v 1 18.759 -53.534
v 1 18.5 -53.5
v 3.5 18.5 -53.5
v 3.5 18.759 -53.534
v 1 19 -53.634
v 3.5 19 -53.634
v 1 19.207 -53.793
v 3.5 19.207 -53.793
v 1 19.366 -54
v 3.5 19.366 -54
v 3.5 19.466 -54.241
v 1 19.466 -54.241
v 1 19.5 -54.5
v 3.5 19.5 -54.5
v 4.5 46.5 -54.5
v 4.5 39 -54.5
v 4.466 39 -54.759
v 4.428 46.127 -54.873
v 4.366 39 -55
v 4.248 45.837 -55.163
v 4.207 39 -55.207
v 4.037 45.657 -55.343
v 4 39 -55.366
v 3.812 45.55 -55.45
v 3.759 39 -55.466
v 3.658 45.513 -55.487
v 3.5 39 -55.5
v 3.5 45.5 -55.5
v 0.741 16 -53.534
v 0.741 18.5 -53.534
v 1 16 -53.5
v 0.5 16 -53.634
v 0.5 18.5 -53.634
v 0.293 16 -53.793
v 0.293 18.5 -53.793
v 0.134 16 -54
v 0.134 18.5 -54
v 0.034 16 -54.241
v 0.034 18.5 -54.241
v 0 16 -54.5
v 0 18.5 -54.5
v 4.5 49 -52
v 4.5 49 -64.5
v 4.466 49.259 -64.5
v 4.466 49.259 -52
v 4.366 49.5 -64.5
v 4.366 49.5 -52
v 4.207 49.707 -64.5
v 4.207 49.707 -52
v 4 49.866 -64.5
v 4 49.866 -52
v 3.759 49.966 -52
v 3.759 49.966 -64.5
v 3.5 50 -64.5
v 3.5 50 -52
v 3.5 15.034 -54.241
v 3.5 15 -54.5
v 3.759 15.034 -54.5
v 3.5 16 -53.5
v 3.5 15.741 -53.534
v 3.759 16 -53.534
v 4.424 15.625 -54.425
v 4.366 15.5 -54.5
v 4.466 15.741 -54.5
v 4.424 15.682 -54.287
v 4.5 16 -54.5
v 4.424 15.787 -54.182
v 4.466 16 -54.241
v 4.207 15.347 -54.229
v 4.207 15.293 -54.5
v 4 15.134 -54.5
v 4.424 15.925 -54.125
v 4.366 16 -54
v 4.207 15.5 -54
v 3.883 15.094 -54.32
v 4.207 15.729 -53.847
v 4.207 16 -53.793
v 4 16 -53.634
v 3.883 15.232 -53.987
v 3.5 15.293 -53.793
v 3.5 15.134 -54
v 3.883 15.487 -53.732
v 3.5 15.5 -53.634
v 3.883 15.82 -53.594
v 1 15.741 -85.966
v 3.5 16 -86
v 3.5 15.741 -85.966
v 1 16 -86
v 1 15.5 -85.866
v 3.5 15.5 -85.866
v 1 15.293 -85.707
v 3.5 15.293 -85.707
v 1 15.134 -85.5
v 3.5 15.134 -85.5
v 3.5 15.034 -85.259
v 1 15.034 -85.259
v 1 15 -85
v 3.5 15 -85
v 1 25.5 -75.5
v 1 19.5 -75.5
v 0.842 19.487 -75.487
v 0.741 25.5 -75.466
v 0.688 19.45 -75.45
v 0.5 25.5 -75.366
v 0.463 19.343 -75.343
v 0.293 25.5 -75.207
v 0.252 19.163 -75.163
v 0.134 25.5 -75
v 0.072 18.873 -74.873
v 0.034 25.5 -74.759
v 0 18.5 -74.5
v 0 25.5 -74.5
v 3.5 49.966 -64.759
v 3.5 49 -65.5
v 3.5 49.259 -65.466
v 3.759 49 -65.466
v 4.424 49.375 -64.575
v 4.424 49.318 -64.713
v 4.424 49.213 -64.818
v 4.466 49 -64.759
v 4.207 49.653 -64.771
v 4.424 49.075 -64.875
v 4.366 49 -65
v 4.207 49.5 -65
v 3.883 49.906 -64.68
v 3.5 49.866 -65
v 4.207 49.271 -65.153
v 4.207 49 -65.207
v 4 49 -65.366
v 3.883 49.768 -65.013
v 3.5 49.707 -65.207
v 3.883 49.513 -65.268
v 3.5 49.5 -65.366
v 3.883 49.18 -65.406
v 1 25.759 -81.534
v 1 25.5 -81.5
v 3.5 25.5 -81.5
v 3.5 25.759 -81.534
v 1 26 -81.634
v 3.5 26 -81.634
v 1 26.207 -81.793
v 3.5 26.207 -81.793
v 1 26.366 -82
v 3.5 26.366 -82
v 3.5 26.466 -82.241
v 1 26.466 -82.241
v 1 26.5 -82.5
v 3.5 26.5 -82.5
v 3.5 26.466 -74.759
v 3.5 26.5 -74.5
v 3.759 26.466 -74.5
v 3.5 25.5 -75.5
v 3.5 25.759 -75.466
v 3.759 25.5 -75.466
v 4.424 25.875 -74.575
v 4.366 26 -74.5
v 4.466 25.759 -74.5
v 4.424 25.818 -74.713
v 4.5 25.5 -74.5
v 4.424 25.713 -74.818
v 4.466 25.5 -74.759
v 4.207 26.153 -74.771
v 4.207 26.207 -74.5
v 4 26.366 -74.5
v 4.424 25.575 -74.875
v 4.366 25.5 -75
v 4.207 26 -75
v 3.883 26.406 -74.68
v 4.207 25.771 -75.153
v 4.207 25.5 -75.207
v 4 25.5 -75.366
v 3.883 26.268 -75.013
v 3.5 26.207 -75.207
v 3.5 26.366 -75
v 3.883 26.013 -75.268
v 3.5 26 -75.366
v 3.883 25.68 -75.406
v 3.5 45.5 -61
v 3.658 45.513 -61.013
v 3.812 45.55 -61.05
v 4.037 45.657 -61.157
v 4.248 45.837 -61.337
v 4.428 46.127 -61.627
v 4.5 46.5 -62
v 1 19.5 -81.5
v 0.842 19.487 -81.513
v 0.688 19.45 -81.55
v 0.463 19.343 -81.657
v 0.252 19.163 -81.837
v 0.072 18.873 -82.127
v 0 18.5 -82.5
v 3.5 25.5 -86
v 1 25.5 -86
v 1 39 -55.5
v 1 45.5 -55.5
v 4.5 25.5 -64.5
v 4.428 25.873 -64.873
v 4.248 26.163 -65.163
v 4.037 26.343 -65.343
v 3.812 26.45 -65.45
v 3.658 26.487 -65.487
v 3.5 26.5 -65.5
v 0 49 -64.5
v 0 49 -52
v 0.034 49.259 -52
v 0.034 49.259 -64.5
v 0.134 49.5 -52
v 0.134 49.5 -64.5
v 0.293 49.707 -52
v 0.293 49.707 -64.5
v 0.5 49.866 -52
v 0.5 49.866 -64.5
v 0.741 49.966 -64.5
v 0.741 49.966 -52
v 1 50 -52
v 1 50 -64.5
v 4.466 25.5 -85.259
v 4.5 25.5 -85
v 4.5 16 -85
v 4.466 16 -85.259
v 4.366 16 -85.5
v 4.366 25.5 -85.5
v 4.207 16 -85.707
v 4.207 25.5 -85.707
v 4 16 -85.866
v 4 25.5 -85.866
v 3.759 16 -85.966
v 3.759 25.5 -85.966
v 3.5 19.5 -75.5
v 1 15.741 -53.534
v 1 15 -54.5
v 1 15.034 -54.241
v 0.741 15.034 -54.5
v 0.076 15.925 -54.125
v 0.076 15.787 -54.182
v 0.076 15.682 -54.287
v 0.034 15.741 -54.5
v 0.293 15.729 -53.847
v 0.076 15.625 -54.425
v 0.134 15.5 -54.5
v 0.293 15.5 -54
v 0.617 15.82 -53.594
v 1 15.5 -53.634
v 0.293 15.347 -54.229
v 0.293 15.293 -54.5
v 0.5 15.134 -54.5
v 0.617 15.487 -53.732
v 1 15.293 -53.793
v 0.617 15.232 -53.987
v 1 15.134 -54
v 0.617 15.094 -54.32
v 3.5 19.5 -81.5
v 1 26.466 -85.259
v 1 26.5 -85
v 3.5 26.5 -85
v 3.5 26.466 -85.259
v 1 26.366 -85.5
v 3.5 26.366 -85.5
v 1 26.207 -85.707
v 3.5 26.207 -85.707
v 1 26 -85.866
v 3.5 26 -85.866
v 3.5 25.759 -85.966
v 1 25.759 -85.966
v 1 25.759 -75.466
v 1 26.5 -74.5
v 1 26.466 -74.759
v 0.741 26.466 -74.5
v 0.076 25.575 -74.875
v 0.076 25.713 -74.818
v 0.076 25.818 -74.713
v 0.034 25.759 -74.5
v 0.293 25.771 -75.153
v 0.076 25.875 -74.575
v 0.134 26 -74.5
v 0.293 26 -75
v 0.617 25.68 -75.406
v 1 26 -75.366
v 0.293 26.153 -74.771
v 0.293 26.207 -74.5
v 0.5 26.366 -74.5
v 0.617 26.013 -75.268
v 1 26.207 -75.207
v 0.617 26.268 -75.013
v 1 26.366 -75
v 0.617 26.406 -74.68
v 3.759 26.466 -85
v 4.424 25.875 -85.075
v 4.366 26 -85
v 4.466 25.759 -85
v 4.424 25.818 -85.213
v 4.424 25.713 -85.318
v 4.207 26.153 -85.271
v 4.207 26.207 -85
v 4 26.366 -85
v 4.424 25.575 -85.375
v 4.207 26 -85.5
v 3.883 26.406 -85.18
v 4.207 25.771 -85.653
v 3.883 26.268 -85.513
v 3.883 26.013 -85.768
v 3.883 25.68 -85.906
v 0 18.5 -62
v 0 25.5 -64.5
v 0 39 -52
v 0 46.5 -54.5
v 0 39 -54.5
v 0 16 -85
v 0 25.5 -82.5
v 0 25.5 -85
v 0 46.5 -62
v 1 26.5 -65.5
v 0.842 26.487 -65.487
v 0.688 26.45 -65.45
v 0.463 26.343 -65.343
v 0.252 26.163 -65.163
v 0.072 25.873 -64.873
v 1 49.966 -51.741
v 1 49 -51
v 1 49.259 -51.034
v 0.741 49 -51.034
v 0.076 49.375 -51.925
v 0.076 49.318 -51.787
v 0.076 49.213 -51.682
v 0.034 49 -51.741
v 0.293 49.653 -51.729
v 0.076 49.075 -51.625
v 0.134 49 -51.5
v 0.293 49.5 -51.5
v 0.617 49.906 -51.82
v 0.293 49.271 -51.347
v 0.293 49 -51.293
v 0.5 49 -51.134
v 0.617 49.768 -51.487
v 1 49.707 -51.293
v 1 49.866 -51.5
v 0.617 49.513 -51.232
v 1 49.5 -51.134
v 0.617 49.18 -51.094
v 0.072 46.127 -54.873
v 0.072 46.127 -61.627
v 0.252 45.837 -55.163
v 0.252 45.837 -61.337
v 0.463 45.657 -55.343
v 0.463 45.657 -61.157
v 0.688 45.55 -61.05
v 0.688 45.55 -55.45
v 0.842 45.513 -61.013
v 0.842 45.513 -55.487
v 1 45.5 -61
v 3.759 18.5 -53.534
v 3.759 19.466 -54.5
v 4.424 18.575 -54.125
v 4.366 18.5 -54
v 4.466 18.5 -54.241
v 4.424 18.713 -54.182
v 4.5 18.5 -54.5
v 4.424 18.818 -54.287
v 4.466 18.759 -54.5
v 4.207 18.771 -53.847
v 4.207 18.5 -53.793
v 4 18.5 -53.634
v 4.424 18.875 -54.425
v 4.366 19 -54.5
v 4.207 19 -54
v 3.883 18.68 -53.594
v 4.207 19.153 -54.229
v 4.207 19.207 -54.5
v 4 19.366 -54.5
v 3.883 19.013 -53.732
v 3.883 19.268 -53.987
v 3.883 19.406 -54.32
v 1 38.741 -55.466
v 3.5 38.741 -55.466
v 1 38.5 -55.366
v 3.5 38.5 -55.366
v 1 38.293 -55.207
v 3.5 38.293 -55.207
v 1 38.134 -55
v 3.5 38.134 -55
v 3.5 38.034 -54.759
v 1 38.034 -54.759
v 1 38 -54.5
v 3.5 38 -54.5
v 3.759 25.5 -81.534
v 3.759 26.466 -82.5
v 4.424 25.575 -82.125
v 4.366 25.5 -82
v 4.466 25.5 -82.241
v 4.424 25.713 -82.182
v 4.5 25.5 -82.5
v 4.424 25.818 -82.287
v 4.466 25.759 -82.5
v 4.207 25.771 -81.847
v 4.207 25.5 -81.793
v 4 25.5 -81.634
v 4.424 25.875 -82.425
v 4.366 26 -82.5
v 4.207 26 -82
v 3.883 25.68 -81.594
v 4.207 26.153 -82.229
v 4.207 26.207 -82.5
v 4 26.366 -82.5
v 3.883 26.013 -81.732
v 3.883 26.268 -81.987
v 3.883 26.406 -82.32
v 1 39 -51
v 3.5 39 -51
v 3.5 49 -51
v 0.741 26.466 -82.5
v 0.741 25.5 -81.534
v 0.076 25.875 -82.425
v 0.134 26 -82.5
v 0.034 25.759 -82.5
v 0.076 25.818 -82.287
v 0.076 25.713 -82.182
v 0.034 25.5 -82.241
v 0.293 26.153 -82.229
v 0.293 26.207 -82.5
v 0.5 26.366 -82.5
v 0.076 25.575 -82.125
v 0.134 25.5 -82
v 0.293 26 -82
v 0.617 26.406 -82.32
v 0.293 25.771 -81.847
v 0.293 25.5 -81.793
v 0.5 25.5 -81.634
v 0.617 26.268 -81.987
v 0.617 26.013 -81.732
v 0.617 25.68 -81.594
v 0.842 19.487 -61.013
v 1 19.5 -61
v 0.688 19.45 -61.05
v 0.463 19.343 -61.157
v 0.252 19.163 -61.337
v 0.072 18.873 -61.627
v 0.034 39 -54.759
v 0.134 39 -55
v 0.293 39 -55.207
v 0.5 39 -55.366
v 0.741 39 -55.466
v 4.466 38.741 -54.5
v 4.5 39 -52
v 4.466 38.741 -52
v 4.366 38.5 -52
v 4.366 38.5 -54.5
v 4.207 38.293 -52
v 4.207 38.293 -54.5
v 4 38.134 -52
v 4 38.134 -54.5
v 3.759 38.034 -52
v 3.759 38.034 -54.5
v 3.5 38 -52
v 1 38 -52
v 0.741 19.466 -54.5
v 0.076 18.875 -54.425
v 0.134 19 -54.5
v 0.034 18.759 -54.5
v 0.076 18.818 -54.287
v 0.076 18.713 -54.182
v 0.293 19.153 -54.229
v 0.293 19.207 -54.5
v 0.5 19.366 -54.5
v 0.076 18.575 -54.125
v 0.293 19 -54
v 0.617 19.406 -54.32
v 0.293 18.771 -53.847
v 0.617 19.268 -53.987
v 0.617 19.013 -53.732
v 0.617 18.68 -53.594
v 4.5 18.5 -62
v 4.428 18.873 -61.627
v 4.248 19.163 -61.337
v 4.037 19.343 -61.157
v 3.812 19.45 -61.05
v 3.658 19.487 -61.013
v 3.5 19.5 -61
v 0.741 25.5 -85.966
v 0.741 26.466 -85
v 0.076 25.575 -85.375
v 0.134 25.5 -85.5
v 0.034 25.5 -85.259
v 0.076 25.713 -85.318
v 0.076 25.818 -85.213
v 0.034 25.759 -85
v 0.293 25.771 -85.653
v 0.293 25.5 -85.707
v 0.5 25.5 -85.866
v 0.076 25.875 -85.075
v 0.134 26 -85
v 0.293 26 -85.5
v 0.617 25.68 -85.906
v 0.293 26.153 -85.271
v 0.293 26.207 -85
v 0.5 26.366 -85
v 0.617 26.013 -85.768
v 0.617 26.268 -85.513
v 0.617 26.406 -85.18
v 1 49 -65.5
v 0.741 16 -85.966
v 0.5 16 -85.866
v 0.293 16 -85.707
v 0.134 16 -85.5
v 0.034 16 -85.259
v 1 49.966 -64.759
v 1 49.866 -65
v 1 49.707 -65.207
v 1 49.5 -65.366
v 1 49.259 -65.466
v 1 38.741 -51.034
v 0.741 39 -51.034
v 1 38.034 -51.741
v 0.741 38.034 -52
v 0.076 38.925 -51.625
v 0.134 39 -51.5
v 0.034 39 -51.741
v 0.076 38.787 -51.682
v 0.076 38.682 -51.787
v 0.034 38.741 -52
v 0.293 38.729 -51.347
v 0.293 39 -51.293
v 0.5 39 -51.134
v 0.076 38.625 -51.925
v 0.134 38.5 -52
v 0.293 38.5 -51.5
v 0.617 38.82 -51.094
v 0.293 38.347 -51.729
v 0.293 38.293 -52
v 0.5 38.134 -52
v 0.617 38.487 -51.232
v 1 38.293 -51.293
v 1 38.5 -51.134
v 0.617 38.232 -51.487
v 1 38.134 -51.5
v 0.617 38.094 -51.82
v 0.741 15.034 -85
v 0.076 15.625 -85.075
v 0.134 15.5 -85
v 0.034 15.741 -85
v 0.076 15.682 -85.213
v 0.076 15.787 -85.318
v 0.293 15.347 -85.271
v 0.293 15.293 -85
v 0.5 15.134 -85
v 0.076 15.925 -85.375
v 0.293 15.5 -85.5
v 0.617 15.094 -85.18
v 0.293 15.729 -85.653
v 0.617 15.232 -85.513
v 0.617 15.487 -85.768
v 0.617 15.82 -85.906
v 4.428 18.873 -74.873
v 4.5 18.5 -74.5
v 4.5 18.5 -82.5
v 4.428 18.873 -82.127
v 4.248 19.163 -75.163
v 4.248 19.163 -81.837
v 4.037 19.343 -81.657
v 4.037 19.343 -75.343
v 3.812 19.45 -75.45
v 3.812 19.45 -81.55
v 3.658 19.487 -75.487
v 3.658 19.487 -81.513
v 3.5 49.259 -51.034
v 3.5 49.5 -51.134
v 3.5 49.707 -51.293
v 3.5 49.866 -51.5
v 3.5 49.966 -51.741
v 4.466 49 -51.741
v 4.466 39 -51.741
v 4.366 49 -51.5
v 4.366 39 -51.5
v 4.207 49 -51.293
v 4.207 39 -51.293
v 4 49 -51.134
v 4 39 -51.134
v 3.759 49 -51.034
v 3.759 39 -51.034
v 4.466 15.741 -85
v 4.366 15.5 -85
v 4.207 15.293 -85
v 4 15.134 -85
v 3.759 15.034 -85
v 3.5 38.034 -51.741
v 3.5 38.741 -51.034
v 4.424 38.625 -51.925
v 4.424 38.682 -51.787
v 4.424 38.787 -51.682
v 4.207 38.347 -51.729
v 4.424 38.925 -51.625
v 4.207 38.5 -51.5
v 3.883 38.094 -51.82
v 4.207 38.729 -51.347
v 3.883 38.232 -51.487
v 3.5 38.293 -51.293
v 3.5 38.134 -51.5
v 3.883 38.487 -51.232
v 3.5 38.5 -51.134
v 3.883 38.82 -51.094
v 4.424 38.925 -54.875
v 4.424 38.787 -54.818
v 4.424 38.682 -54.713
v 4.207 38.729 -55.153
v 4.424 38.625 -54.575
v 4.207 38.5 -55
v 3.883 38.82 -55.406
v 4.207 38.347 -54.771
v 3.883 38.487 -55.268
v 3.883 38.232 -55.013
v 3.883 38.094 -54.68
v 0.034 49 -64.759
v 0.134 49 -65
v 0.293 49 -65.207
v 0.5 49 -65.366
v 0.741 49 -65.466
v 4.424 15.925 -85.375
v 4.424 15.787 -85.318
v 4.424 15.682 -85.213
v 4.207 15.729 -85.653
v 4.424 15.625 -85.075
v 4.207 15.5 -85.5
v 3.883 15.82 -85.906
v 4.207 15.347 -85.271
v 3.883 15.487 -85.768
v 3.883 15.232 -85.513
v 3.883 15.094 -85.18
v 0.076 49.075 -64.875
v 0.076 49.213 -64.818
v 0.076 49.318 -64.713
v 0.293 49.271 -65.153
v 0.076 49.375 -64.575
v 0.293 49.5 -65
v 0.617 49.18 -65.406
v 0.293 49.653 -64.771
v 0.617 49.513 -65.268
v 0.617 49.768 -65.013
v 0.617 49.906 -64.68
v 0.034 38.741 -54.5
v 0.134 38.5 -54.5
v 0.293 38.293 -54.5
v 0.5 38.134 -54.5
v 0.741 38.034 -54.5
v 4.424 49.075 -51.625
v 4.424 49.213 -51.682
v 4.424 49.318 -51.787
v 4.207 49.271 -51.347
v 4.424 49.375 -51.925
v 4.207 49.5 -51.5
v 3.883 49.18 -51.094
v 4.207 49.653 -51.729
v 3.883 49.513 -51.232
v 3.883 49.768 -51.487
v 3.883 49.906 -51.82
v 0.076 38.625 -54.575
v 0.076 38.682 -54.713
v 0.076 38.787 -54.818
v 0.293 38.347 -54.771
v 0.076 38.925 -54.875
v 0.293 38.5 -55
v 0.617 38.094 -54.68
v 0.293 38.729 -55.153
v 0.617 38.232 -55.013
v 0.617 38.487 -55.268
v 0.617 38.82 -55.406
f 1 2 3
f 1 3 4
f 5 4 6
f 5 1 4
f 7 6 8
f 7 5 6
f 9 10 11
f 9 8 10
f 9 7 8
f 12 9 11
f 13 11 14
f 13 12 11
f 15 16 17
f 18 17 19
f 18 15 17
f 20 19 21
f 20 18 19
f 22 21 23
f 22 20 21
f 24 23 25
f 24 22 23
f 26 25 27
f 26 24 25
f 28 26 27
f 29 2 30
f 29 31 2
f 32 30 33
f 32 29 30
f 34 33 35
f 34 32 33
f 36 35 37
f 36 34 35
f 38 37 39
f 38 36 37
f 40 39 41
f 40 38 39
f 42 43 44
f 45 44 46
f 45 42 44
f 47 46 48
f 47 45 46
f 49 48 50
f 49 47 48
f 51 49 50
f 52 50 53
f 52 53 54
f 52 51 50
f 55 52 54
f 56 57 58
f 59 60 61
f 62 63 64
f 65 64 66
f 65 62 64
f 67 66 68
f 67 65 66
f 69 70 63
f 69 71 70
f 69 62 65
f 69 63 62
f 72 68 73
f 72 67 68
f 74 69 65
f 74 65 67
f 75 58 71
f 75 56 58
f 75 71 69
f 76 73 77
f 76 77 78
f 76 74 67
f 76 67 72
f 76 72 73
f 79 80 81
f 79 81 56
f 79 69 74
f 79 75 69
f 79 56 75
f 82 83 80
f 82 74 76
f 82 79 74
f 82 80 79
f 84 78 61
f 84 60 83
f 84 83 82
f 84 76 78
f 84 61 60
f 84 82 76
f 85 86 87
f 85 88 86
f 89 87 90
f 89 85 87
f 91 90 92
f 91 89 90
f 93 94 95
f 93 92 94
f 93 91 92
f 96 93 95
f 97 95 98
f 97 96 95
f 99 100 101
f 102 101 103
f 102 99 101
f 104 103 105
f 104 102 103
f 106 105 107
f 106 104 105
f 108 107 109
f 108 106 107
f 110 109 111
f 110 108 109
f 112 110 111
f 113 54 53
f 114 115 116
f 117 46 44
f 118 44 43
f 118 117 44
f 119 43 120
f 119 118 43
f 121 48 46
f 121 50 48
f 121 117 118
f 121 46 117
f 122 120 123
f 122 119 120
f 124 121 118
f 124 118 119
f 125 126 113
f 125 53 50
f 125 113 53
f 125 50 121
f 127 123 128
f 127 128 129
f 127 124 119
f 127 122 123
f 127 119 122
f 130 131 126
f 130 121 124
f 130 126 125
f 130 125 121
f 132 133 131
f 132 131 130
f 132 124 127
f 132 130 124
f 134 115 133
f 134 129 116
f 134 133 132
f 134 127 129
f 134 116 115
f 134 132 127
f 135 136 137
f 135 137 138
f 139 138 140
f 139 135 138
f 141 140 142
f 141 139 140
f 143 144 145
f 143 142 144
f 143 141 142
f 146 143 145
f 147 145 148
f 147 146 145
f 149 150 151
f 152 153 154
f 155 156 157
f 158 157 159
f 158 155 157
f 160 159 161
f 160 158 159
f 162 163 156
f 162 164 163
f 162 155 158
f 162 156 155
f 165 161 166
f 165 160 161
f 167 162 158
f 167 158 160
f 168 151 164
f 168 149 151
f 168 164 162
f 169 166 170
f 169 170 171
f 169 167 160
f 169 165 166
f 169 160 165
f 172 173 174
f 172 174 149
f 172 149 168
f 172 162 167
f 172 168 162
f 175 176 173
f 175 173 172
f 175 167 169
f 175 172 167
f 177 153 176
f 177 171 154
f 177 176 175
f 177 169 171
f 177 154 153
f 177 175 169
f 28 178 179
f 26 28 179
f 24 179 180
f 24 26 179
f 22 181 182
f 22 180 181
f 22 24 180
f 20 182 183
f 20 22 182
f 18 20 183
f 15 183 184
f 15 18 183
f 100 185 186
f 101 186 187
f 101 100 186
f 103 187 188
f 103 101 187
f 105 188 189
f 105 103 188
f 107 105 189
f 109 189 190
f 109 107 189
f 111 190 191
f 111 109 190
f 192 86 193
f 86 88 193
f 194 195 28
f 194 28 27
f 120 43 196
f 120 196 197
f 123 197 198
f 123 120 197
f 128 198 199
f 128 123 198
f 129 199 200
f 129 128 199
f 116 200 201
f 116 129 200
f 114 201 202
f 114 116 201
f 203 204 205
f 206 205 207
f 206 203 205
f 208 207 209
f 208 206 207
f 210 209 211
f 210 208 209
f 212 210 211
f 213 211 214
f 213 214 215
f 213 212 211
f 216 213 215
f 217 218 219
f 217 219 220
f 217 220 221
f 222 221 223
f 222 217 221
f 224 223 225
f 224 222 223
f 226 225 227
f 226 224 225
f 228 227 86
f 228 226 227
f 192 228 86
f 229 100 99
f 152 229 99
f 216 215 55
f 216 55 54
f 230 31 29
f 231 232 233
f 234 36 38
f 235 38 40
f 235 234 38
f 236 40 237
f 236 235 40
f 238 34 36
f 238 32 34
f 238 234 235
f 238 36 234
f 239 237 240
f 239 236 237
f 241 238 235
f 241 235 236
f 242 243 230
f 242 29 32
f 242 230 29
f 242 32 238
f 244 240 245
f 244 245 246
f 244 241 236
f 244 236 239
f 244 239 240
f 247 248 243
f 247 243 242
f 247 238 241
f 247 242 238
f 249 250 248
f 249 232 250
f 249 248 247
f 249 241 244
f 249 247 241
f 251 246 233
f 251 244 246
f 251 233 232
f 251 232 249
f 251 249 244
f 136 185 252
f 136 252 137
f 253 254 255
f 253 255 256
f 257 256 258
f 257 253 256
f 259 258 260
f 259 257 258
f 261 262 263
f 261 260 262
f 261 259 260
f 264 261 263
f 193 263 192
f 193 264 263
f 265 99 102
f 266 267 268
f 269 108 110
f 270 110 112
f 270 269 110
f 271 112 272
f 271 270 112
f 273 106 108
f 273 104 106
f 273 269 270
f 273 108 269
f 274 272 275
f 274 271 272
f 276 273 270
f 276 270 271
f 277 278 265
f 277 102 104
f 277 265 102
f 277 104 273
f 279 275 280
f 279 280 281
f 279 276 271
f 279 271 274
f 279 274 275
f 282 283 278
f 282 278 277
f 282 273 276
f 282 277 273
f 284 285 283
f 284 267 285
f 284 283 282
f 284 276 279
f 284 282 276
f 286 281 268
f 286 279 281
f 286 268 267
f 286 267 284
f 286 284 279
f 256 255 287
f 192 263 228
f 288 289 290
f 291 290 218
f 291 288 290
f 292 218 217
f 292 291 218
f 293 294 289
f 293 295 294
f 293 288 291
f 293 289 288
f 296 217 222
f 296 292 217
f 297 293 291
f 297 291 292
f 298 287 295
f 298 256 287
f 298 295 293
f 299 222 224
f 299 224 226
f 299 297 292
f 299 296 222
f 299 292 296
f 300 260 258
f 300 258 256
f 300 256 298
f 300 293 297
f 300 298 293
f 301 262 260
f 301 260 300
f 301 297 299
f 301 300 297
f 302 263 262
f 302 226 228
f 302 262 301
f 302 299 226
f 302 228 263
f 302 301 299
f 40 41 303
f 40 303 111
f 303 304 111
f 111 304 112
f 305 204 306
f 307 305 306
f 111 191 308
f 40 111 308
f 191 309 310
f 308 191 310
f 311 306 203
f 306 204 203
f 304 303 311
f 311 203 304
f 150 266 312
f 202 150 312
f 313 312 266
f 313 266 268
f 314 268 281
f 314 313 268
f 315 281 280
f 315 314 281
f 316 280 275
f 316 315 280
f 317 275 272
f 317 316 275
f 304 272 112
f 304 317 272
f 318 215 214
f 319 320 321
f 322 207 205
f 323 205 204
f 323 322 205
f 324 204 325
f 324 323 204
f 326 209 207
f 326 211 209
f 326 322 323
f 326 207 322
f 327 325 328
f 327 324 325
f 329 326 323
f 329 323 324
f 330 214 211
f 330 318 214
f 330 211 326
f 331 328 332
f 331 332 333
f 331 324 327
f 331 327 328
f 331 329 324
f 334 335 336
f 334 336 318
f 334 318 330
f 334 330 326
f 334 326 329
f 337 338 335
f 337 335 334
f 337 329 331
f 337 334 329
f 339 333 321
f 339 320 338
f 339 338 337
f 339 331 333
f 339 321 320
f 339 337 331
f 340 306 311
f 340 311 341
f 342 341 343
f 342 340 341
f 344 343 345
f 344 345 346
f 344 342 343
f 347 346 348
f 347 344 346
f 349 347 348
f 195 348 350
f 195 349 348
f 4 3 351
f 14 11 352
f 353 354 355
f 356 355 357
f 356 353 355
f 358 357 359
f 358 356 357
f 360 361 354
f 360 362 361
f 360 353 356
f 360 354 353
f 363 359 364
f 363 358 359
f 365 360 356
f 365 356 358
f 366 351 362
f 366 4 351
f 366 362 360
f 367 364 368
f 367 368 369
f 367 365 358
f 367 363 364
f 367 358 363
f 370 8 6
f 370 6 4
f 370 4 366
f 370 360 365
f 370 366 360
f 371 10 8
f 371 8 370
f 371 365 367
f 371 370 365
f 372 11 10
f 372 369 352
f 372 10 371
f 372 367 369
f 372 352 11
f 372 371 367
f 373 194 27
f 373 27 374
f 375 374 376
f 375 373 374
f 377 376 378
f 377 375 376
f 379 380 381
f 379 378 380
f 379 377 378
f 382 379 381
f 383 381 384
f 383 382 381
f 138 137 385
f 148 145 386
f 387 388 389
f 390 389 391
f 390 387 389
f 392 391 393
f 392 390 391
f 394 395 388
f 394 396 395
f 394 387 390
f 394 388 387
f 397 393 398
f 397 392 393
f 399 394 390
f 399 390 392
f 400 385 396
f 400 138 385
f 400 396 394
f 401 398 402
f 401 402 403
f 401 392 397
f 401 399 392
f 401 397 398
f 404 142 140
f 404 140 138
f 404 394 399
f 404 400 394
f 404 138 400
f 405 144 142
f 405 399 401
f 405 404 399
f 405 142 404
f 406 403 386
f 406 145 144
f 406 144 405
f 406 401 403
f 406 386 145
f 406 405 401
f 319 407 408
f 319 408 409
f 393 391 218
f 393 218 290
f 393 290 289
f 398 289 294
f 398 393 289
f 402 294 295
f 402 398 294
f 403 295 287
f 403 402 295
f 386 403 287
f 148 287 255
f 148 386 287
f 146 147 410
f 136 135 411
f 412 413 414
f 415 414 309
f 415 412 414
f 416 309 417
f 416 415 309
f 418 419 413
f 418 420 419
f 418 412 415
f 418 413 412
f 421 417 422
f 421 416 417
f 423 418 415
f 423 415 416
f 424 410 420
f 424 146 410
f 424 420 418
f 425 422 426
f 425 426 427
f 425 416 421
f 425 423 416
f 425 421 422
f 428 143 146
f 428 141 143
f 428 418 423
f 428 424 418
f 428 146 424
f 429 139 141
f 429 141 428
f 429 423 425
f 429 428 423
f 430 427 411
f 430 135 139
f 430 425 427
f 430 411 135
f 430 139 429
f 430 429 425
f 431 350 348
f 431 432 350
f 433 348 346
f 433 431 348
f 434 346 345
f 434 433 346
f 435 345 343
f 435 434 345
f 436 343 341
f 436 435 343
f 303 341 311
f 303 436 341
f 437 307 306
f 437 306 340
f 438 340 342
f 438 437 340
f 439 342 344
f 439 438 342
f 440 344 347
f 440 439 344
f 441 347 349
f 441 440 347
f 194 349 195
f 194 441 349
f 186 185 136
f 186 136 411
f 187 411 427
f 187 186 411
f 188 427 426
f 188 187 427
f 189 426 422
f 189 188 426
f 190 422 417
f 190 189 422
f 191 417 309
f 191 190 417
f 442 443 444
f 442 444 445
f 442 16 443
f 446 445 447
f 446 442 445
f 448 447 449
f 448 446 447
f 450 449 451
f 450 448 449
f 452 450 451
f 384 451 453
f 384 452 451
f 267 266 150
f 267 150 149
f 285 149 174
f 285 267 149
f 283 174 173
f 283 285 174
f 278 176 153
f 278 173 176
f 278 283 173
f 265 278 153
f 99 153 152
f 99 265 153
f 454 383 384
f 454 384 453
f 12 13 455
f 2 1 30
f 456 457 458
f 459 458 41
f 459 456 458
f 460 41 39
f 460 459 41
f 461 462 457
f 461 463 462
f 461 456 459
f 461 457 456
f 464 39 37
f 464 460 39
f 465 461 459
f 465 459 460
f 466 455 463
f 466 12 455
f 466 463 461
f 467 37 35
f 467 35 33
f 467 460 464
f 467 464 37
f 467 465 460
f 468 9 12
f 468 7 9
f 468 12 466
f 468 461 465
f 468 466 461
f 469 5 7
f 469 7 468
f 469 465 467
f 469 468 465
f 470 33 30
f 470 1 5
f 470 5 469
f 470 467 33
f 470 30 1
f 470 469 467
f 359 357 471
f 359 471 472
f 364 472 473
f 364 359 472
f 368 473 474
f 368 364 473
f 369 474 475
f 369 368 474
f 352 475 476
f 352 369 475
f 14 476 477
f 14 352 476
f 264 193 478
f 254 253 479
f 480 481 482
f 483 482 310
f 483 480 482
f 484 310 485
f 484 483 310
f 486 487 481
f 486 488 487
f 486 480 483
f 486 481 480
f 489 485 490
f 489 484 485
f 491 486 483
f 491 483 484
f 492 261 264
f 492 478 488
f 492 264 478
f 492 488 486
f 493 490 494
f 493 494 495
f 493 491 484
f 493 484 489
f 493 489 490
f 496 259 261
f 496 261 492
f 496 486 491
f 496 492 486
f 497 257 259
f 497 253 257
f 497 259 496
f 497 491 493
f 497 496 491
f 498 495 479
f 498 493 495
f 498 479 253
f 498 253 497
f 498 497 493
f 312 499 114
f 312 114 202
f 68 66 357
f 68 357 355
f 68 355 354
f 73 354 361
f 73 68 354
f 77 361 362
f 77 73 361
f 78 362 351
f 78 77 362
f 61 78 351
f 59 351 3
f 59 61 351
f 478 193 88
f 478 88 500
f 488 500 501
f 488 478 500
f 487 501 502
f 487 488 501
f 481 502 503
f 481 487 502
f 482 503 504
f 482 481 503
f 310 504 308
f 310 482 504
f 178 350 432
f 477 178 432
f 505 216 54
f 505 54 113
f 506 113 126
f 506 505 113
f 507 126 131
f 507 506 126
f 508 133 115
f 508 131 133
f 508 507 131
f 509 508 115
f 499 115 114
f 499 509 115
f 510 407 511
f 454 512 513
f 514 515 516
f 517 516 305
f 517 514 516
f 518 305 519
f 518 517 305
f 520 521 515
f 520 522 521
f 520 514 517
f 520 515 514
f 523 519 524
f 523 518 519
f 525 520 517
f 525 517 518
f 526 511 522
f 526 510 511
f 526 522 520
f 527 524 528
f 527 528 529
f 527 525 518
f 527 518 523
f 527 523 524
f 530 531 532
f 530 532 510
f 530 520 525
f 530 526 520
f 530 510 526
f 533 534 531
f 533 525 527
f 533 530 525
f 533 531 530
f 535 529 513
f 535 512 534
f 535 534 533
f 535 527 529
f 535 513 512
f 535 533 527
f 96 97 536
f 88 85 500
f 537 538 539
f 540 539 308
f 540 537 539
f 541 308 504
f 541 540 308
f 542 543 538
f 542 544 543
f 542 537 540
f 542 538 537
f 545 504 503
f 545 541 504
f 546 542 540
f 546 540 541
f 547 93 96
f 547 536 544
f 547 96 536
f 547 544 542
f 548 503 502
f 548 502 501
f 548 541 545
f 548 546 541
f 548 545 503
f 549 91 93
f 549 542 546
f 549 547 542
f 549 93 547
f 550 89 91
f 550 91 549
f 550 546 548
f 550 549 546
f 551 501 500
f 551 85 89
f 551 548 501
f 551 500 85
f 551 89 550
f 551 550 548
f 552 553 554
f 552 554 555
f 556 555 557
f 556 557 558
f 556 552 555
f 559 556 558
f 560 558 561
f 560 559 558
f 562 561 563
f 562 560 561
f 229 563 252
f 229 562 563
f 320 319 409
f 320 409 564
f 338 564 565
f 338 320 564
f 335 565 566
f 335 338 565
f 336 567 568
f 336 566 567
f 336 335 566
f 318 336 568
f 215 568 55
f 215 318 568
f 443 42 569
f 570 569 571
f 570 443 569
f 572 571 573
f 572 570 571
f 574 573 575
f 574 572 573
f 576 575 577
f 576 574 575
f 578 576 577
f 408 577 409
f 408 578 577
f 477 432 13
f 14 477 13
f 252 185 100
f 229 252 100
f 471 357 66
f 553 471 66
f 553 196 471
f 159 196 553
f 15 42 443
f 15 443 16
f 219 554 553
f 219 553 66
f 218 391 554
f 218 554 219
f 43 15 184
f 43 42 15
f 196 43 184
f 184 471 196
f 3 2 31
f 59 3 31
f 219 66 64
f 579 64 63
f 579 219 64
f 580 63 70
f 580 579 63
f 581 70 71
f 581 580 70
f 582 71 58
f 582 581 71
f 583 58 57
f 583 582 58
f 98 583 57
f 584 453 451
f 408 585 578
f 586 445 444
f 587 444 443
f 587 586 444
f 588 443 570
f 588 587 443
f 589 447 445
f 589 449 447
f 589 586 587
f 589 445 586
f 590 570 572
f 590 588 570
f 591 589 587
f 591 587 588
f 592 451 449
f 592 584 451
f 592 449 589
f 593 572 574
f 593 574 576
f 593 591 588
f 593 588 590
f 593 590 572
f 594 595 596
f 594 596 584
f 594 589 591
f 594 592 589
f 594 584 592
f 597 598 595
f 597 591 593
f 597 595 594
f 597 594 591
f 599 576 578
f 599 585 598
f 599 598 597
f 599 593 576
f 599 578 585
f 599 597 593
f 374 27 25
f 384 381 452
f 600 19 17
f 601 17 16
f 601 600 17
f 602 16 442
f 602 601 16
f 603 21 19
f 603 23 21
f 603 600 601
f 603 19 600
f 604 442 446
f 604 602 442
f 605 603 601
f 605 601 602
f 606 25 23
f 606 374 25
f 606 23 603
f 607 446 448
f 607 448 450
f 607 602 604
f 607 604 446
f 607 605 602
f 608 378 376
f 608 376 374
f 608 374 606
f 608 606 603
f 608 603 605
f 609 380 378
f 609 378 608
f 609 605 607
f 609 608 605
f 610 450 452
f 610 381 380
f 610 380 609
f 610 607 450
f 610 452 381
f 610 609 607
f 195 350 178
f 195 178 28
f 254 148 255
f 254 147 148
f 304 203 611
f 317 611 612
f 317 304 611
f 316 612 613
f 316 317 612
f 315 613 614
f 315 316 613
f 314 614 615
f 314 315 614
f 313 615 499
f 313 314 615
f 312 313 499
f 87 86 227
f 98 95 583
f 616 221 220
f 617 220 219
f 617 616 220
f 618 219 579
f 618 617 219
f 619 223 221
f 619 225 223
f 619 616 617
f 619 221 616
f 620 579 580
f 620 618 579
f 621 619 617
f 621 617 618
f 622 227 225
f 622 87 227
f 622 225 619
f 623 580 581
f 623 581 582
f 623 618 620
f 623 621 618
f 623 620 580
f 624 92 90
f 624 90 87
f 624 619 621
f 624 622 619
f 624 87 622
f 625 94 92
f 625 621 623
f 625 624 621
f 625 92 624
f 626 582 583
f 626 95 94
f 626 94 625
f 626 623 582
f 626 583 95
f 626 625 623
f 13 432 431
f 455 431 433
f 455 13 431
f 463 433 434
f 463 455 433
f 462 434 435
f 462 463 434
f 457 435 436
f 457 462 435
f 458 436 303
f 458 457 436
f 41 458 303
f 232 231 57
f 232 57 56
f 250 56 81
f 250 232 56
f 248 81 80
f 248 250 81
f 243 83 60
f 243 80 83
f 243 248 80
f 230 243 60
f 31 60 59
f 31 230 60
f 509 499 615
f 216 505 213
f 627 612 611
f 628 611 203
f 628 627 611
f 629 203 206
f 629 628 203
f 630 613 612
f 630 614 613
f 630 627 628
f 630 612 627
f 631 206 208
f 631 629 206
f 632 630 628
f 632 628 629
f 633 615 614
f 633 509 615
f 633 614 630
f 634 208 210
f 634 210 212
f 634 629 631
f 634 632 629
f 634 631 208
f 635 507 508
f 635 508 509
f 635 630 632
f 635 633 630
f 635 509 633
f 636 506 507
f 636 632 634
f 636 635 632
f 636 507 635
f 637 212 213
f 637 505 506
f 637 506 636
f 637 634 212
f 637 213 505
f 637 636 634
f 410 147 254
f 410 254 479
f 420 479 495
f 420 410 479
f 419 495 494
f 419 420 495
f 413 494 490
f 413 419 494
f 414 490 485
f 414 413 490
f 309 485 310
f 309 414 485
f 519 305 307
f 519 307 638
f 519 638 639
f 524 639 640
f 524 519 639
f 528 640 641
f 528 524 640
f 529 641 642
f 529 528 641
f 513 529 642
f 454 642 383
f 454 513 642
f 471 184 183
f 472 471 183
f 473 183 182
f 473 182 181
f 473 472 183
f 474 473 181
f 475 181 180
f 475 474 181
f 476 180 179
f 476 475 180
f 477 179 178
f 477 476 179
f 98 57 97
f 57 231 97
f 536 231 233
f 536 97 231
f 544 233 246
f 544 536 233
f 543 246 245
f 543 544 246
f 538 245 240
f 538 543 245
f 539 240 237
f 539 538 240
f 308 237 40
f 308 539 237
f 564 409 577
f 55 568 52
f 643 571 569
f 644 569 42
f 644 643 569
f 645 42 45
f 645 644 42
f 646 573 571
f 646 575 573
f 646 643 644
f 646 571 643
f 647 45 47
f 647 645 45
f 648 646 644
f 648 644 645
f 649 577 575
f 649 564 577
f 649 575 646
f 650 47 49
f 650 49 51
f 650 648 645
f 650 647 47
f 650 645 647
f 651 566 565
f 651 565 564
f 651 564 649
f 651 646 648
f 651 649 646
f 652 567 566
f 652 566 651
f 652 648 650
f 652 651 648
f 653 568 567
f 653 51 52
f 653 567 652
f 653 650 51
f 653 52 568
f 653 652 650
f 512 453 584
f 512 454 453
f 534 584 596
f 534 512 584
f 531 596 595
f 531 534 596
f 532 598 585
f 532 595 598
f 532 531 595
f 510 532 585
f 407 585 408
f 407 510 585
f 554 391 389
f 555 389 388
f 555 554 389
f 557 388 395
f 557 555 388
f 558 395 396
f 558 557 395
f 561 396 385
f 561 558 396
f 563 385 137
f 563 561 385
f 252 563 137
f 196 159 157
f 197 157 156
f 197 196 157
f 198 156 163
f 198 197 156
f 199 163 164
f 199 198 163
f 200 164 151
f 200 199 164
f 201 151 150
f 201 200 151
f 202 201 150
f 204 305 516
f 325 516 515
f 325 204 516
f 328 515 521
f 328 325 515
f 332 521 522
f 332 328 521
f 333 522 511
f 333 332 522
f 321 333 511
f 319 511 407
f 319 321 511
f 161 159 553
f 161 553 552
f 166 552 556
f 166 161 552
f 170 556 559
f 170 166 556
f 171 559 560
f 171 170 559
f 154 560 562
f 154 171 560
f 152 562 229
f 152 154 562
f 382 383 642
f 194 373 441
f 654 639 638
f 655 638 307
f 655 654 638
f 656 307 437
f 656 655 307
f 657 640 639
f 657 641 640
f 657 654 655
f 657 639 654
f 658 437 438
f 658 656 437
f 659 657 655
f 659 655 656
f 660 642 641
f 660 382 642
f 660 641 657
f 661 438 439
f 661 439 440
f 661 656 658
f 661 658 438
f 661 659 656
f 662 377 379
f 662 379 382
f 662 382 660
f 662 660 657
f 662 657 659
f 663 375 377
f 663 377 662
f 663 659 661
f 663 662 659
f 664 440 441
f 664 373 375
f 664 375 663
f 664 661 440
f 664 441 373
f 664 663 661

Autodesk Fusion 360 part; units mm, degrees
sketch "Sketch1" plane through (0, 0, 0) normal (1, 0, 0) x (0, 0, -1)
  line L0 (-50, 20) -> (-4, 20)
  line L1 (-4, 20) -> (-4, -11.5)
  line L2 (-4, -11.5) -> (-50, -11.5)
  line L3 (-50, -11.5) -> (-50, 20)
  line L4 (-65.5096, 6.4803) -> (-1.0096, 6.4803)
  line L5 (-1.0096, 6.4803) -> (-1.0096, -9.308)
  line L6 (-1.0096, -9.308) -> (-65.5096, -9.308)
  line L7 (-65.5096, -9.308) -> (-65.5096, 6.4803)
  line L8 (52, 50) -> (64.5, 50)
  line L9 (65.5, 49) -> (65.5, 45.5)
  line L10 (65.5, 45.5) -> (51, 45.5)
  line L11 (51, 45.5) -> (51, 49)
  line L12 (51, 45.5) -> (55.5, 45.5)
  line L13 (55.5, 45.5) -> (55.5, 39)
  line L14 (54.5, 38) -> (52, 38)
  line L15 (51, 39) -> (51, 45.5)
  line L16 (65.5, 45.5) -> (61, 45.5)
  line L17 (61, 45.5) -> (61, 19.5)
  line L18 (61, 19.5) -> (65.5, 19.5)
  line L19 (65.5, 19.5) -> (65.5, 45.5)
  line L20 (65.5, 19.5) -> (54.5, 19.5)
  line L21 (53.5, 18.5) -> (53.5, 16)
  line L22 (54.5, 15) -> (65.5, 15)
  line L23 (65.5, 15) -> (65.5, 19.5)
  line L24 (65.5, 15) -> (75.5, 15)
  line L25 (75.5, 15) -> (75.5, 25.5)
  line L26 (74.5, 26.5) -> (65.5, 26.5)
  line L27 (65.5, 26.5) -> (65.5, 15)
  line L28 (75.5, 15) -> (85, 15)
  line L29 (86, 16) -> (86, 19.5)
  line L30 (86, 19.5) -> (75.5, 19.5)
  line L31 (75.5, 19.5) -> (75.5, 15)
  line L32 (86, 19.5) -> (81.5, 19.5)
  line L33 (81.5, 19.5) -> (81.5, 25.5)
  line L34 (82.5, 26.5) -> (85, 26.5)
  line L35 (86, 25.5) -> (86, 19.5)
  arc A0 (52, 50) -> (51, 49) centre (52, 49) ccw
  arc A1 (65.5, 49) -> (64.5, 50) centre (64.5, 49) ccw
  arc A2 (51, 39) -> (52, 38) centre (52, 39) ccw
  arc A3 (54.5, 38) -> (55.5, 39) centre (54.5, 39) ccw
  arc A4 (54.5, 19.5) -> (53.5, 18.5) centre (54.5, 18.5) ccw
  arc A5 (53.5, 16) -> (54.5, 15) centre (54.5, 16) ccw
  arc A6 (75.5, 25.5) -> (74.5, 26.5) centre (74.5, 25.5) ccw
  arc A7 (82.5, 26.5) -> (81.5, 25.5) centre (82.5, 25.5) ccw
  arc A8 (86, 25.5) -> (85, 26.5) centre (85, 25.5) ccw
  arc A9 (85, 15) -> (86, 16) centre (85, 16) ccw
  point P0 (51, 50)
  point P1 (65.5, 50)
  point P2 (51, 38)
  point P3 (53.5, 19.5)
  point P4 (86, 15)
  point P5 (86, 26.5)
  dimension "d1" = 46
  dimension "d2" = 31.5
  dimension "d3" = 64.5
  dimension "d4" = 14.5
  dimension "d5" = 4.5
  dimension "d6" = 4.5
  dimension "d7" = 7.5
  dimension "d8" = 4.5
  dimension "d9" = 26
  dimension "d10" = 12
  dimension "d11" = 4.5
  dimension "d12" = 10
  dimension "d13" = 11.5
  dimension "d14" = 10.5
  dimension "d15" = 4.5
  dimension "d16" = 4.5
  dimension "d17" = 7
  dimension "d18" = 1
extrude "Extrude1" add sketch "Sketch1" along normal blind 4.5 contours L8 L9 L10 L11 L12 L16 A0 A1 | L10 L12 L13 L14 L15 A2 A3 | L10 L16 L17 L18 L19 L20 L27 | L19 L23 L24 L25 L26 L27 L31 A6 | L18 L20 L21 L22 L23 L27 A4 A5 | L25 L28 L29 L30 L31 L32 A9 | L30 L32 L33 L34 L35 A7 A8
fillet "Fillet1" radius 1 26 edges at (4.5, 37.75, -65.5) (4.5, 49.7071, -65.2071) (4.5, 50, -58.25) (4.5, 49.7071, -51.2929) (4.5, 44, -51) (4.5, 38.2929, -51.2929) (4.5, 38, -53.25) (4.5, 38.2929, -55.2071) (4.5, 42.25, -55.5) (4.5, 22.5, -75.5) (4.5, 26.2071, -75.2071) (4.5, 26.5, -70) (4.5, 19.5, -78.5) (4.5, 19.5, -57.75) (4.5, 19.2071, -53.7929) (4.5, 17.25, -53.5) (4.5, 15.2929, -53.7929) (4.5, 15, -69.75) (4.5, 15.2929, -85.7071) (4.5, 20.75, -86) (4.5, 26.2071, -85.7071) (4.5, 26.5, -83.75) (4.5, 26.2071, -81.7929) (4.5, 22.5, -81.5) (4.5, 32.5, -61) (4.5, 45.5, -58.25)
fillet "Fillet2" radius 1 26 edges at (0, 22.5, -75.5) (0, 26.2071, -75.2071) (0, 26.5, -70) (0, 37.75, -65.5) (0, 49.7071, -65.2071) (0, 50, -58.25) (0, 49.7071, -51.2929) (0, 44, -51) (0, 38.2929, -51.2929) (0, 38, -53.25) (0, 38.2929, -55.2071) (0, 42.25, -55.5) (0, 45.5, -58.25) (0, 32.5, -61) (0, 19.5, -57.75) (0, 19.2071, -53.7929) (0, 17.25, -53.5) (0, 15.2929, -53.7929) (0, 15, -69.75) (0, 15.2929, -85.7071) (0, 20.75, -86) (0, 26.2071, -85.7071) (0, 26.5, -83.75) (0, 26.2071, -81.7929) (0, 22.5, -81.5) (0, 19.5, -78.5)
equation "d4 = 4.5 mm + 5.5 mm + 4.5 mm"
equation "d7 = 12 mm - d5"
equation "d10 = 4.5 mm + 7.5 mm"
equation "d12 = 5.5 mm + 4.5 mm"
equation "d13 = 4.5 mm + 7 mm"
equation "d14 = 6 mm + 4.5 mm"
